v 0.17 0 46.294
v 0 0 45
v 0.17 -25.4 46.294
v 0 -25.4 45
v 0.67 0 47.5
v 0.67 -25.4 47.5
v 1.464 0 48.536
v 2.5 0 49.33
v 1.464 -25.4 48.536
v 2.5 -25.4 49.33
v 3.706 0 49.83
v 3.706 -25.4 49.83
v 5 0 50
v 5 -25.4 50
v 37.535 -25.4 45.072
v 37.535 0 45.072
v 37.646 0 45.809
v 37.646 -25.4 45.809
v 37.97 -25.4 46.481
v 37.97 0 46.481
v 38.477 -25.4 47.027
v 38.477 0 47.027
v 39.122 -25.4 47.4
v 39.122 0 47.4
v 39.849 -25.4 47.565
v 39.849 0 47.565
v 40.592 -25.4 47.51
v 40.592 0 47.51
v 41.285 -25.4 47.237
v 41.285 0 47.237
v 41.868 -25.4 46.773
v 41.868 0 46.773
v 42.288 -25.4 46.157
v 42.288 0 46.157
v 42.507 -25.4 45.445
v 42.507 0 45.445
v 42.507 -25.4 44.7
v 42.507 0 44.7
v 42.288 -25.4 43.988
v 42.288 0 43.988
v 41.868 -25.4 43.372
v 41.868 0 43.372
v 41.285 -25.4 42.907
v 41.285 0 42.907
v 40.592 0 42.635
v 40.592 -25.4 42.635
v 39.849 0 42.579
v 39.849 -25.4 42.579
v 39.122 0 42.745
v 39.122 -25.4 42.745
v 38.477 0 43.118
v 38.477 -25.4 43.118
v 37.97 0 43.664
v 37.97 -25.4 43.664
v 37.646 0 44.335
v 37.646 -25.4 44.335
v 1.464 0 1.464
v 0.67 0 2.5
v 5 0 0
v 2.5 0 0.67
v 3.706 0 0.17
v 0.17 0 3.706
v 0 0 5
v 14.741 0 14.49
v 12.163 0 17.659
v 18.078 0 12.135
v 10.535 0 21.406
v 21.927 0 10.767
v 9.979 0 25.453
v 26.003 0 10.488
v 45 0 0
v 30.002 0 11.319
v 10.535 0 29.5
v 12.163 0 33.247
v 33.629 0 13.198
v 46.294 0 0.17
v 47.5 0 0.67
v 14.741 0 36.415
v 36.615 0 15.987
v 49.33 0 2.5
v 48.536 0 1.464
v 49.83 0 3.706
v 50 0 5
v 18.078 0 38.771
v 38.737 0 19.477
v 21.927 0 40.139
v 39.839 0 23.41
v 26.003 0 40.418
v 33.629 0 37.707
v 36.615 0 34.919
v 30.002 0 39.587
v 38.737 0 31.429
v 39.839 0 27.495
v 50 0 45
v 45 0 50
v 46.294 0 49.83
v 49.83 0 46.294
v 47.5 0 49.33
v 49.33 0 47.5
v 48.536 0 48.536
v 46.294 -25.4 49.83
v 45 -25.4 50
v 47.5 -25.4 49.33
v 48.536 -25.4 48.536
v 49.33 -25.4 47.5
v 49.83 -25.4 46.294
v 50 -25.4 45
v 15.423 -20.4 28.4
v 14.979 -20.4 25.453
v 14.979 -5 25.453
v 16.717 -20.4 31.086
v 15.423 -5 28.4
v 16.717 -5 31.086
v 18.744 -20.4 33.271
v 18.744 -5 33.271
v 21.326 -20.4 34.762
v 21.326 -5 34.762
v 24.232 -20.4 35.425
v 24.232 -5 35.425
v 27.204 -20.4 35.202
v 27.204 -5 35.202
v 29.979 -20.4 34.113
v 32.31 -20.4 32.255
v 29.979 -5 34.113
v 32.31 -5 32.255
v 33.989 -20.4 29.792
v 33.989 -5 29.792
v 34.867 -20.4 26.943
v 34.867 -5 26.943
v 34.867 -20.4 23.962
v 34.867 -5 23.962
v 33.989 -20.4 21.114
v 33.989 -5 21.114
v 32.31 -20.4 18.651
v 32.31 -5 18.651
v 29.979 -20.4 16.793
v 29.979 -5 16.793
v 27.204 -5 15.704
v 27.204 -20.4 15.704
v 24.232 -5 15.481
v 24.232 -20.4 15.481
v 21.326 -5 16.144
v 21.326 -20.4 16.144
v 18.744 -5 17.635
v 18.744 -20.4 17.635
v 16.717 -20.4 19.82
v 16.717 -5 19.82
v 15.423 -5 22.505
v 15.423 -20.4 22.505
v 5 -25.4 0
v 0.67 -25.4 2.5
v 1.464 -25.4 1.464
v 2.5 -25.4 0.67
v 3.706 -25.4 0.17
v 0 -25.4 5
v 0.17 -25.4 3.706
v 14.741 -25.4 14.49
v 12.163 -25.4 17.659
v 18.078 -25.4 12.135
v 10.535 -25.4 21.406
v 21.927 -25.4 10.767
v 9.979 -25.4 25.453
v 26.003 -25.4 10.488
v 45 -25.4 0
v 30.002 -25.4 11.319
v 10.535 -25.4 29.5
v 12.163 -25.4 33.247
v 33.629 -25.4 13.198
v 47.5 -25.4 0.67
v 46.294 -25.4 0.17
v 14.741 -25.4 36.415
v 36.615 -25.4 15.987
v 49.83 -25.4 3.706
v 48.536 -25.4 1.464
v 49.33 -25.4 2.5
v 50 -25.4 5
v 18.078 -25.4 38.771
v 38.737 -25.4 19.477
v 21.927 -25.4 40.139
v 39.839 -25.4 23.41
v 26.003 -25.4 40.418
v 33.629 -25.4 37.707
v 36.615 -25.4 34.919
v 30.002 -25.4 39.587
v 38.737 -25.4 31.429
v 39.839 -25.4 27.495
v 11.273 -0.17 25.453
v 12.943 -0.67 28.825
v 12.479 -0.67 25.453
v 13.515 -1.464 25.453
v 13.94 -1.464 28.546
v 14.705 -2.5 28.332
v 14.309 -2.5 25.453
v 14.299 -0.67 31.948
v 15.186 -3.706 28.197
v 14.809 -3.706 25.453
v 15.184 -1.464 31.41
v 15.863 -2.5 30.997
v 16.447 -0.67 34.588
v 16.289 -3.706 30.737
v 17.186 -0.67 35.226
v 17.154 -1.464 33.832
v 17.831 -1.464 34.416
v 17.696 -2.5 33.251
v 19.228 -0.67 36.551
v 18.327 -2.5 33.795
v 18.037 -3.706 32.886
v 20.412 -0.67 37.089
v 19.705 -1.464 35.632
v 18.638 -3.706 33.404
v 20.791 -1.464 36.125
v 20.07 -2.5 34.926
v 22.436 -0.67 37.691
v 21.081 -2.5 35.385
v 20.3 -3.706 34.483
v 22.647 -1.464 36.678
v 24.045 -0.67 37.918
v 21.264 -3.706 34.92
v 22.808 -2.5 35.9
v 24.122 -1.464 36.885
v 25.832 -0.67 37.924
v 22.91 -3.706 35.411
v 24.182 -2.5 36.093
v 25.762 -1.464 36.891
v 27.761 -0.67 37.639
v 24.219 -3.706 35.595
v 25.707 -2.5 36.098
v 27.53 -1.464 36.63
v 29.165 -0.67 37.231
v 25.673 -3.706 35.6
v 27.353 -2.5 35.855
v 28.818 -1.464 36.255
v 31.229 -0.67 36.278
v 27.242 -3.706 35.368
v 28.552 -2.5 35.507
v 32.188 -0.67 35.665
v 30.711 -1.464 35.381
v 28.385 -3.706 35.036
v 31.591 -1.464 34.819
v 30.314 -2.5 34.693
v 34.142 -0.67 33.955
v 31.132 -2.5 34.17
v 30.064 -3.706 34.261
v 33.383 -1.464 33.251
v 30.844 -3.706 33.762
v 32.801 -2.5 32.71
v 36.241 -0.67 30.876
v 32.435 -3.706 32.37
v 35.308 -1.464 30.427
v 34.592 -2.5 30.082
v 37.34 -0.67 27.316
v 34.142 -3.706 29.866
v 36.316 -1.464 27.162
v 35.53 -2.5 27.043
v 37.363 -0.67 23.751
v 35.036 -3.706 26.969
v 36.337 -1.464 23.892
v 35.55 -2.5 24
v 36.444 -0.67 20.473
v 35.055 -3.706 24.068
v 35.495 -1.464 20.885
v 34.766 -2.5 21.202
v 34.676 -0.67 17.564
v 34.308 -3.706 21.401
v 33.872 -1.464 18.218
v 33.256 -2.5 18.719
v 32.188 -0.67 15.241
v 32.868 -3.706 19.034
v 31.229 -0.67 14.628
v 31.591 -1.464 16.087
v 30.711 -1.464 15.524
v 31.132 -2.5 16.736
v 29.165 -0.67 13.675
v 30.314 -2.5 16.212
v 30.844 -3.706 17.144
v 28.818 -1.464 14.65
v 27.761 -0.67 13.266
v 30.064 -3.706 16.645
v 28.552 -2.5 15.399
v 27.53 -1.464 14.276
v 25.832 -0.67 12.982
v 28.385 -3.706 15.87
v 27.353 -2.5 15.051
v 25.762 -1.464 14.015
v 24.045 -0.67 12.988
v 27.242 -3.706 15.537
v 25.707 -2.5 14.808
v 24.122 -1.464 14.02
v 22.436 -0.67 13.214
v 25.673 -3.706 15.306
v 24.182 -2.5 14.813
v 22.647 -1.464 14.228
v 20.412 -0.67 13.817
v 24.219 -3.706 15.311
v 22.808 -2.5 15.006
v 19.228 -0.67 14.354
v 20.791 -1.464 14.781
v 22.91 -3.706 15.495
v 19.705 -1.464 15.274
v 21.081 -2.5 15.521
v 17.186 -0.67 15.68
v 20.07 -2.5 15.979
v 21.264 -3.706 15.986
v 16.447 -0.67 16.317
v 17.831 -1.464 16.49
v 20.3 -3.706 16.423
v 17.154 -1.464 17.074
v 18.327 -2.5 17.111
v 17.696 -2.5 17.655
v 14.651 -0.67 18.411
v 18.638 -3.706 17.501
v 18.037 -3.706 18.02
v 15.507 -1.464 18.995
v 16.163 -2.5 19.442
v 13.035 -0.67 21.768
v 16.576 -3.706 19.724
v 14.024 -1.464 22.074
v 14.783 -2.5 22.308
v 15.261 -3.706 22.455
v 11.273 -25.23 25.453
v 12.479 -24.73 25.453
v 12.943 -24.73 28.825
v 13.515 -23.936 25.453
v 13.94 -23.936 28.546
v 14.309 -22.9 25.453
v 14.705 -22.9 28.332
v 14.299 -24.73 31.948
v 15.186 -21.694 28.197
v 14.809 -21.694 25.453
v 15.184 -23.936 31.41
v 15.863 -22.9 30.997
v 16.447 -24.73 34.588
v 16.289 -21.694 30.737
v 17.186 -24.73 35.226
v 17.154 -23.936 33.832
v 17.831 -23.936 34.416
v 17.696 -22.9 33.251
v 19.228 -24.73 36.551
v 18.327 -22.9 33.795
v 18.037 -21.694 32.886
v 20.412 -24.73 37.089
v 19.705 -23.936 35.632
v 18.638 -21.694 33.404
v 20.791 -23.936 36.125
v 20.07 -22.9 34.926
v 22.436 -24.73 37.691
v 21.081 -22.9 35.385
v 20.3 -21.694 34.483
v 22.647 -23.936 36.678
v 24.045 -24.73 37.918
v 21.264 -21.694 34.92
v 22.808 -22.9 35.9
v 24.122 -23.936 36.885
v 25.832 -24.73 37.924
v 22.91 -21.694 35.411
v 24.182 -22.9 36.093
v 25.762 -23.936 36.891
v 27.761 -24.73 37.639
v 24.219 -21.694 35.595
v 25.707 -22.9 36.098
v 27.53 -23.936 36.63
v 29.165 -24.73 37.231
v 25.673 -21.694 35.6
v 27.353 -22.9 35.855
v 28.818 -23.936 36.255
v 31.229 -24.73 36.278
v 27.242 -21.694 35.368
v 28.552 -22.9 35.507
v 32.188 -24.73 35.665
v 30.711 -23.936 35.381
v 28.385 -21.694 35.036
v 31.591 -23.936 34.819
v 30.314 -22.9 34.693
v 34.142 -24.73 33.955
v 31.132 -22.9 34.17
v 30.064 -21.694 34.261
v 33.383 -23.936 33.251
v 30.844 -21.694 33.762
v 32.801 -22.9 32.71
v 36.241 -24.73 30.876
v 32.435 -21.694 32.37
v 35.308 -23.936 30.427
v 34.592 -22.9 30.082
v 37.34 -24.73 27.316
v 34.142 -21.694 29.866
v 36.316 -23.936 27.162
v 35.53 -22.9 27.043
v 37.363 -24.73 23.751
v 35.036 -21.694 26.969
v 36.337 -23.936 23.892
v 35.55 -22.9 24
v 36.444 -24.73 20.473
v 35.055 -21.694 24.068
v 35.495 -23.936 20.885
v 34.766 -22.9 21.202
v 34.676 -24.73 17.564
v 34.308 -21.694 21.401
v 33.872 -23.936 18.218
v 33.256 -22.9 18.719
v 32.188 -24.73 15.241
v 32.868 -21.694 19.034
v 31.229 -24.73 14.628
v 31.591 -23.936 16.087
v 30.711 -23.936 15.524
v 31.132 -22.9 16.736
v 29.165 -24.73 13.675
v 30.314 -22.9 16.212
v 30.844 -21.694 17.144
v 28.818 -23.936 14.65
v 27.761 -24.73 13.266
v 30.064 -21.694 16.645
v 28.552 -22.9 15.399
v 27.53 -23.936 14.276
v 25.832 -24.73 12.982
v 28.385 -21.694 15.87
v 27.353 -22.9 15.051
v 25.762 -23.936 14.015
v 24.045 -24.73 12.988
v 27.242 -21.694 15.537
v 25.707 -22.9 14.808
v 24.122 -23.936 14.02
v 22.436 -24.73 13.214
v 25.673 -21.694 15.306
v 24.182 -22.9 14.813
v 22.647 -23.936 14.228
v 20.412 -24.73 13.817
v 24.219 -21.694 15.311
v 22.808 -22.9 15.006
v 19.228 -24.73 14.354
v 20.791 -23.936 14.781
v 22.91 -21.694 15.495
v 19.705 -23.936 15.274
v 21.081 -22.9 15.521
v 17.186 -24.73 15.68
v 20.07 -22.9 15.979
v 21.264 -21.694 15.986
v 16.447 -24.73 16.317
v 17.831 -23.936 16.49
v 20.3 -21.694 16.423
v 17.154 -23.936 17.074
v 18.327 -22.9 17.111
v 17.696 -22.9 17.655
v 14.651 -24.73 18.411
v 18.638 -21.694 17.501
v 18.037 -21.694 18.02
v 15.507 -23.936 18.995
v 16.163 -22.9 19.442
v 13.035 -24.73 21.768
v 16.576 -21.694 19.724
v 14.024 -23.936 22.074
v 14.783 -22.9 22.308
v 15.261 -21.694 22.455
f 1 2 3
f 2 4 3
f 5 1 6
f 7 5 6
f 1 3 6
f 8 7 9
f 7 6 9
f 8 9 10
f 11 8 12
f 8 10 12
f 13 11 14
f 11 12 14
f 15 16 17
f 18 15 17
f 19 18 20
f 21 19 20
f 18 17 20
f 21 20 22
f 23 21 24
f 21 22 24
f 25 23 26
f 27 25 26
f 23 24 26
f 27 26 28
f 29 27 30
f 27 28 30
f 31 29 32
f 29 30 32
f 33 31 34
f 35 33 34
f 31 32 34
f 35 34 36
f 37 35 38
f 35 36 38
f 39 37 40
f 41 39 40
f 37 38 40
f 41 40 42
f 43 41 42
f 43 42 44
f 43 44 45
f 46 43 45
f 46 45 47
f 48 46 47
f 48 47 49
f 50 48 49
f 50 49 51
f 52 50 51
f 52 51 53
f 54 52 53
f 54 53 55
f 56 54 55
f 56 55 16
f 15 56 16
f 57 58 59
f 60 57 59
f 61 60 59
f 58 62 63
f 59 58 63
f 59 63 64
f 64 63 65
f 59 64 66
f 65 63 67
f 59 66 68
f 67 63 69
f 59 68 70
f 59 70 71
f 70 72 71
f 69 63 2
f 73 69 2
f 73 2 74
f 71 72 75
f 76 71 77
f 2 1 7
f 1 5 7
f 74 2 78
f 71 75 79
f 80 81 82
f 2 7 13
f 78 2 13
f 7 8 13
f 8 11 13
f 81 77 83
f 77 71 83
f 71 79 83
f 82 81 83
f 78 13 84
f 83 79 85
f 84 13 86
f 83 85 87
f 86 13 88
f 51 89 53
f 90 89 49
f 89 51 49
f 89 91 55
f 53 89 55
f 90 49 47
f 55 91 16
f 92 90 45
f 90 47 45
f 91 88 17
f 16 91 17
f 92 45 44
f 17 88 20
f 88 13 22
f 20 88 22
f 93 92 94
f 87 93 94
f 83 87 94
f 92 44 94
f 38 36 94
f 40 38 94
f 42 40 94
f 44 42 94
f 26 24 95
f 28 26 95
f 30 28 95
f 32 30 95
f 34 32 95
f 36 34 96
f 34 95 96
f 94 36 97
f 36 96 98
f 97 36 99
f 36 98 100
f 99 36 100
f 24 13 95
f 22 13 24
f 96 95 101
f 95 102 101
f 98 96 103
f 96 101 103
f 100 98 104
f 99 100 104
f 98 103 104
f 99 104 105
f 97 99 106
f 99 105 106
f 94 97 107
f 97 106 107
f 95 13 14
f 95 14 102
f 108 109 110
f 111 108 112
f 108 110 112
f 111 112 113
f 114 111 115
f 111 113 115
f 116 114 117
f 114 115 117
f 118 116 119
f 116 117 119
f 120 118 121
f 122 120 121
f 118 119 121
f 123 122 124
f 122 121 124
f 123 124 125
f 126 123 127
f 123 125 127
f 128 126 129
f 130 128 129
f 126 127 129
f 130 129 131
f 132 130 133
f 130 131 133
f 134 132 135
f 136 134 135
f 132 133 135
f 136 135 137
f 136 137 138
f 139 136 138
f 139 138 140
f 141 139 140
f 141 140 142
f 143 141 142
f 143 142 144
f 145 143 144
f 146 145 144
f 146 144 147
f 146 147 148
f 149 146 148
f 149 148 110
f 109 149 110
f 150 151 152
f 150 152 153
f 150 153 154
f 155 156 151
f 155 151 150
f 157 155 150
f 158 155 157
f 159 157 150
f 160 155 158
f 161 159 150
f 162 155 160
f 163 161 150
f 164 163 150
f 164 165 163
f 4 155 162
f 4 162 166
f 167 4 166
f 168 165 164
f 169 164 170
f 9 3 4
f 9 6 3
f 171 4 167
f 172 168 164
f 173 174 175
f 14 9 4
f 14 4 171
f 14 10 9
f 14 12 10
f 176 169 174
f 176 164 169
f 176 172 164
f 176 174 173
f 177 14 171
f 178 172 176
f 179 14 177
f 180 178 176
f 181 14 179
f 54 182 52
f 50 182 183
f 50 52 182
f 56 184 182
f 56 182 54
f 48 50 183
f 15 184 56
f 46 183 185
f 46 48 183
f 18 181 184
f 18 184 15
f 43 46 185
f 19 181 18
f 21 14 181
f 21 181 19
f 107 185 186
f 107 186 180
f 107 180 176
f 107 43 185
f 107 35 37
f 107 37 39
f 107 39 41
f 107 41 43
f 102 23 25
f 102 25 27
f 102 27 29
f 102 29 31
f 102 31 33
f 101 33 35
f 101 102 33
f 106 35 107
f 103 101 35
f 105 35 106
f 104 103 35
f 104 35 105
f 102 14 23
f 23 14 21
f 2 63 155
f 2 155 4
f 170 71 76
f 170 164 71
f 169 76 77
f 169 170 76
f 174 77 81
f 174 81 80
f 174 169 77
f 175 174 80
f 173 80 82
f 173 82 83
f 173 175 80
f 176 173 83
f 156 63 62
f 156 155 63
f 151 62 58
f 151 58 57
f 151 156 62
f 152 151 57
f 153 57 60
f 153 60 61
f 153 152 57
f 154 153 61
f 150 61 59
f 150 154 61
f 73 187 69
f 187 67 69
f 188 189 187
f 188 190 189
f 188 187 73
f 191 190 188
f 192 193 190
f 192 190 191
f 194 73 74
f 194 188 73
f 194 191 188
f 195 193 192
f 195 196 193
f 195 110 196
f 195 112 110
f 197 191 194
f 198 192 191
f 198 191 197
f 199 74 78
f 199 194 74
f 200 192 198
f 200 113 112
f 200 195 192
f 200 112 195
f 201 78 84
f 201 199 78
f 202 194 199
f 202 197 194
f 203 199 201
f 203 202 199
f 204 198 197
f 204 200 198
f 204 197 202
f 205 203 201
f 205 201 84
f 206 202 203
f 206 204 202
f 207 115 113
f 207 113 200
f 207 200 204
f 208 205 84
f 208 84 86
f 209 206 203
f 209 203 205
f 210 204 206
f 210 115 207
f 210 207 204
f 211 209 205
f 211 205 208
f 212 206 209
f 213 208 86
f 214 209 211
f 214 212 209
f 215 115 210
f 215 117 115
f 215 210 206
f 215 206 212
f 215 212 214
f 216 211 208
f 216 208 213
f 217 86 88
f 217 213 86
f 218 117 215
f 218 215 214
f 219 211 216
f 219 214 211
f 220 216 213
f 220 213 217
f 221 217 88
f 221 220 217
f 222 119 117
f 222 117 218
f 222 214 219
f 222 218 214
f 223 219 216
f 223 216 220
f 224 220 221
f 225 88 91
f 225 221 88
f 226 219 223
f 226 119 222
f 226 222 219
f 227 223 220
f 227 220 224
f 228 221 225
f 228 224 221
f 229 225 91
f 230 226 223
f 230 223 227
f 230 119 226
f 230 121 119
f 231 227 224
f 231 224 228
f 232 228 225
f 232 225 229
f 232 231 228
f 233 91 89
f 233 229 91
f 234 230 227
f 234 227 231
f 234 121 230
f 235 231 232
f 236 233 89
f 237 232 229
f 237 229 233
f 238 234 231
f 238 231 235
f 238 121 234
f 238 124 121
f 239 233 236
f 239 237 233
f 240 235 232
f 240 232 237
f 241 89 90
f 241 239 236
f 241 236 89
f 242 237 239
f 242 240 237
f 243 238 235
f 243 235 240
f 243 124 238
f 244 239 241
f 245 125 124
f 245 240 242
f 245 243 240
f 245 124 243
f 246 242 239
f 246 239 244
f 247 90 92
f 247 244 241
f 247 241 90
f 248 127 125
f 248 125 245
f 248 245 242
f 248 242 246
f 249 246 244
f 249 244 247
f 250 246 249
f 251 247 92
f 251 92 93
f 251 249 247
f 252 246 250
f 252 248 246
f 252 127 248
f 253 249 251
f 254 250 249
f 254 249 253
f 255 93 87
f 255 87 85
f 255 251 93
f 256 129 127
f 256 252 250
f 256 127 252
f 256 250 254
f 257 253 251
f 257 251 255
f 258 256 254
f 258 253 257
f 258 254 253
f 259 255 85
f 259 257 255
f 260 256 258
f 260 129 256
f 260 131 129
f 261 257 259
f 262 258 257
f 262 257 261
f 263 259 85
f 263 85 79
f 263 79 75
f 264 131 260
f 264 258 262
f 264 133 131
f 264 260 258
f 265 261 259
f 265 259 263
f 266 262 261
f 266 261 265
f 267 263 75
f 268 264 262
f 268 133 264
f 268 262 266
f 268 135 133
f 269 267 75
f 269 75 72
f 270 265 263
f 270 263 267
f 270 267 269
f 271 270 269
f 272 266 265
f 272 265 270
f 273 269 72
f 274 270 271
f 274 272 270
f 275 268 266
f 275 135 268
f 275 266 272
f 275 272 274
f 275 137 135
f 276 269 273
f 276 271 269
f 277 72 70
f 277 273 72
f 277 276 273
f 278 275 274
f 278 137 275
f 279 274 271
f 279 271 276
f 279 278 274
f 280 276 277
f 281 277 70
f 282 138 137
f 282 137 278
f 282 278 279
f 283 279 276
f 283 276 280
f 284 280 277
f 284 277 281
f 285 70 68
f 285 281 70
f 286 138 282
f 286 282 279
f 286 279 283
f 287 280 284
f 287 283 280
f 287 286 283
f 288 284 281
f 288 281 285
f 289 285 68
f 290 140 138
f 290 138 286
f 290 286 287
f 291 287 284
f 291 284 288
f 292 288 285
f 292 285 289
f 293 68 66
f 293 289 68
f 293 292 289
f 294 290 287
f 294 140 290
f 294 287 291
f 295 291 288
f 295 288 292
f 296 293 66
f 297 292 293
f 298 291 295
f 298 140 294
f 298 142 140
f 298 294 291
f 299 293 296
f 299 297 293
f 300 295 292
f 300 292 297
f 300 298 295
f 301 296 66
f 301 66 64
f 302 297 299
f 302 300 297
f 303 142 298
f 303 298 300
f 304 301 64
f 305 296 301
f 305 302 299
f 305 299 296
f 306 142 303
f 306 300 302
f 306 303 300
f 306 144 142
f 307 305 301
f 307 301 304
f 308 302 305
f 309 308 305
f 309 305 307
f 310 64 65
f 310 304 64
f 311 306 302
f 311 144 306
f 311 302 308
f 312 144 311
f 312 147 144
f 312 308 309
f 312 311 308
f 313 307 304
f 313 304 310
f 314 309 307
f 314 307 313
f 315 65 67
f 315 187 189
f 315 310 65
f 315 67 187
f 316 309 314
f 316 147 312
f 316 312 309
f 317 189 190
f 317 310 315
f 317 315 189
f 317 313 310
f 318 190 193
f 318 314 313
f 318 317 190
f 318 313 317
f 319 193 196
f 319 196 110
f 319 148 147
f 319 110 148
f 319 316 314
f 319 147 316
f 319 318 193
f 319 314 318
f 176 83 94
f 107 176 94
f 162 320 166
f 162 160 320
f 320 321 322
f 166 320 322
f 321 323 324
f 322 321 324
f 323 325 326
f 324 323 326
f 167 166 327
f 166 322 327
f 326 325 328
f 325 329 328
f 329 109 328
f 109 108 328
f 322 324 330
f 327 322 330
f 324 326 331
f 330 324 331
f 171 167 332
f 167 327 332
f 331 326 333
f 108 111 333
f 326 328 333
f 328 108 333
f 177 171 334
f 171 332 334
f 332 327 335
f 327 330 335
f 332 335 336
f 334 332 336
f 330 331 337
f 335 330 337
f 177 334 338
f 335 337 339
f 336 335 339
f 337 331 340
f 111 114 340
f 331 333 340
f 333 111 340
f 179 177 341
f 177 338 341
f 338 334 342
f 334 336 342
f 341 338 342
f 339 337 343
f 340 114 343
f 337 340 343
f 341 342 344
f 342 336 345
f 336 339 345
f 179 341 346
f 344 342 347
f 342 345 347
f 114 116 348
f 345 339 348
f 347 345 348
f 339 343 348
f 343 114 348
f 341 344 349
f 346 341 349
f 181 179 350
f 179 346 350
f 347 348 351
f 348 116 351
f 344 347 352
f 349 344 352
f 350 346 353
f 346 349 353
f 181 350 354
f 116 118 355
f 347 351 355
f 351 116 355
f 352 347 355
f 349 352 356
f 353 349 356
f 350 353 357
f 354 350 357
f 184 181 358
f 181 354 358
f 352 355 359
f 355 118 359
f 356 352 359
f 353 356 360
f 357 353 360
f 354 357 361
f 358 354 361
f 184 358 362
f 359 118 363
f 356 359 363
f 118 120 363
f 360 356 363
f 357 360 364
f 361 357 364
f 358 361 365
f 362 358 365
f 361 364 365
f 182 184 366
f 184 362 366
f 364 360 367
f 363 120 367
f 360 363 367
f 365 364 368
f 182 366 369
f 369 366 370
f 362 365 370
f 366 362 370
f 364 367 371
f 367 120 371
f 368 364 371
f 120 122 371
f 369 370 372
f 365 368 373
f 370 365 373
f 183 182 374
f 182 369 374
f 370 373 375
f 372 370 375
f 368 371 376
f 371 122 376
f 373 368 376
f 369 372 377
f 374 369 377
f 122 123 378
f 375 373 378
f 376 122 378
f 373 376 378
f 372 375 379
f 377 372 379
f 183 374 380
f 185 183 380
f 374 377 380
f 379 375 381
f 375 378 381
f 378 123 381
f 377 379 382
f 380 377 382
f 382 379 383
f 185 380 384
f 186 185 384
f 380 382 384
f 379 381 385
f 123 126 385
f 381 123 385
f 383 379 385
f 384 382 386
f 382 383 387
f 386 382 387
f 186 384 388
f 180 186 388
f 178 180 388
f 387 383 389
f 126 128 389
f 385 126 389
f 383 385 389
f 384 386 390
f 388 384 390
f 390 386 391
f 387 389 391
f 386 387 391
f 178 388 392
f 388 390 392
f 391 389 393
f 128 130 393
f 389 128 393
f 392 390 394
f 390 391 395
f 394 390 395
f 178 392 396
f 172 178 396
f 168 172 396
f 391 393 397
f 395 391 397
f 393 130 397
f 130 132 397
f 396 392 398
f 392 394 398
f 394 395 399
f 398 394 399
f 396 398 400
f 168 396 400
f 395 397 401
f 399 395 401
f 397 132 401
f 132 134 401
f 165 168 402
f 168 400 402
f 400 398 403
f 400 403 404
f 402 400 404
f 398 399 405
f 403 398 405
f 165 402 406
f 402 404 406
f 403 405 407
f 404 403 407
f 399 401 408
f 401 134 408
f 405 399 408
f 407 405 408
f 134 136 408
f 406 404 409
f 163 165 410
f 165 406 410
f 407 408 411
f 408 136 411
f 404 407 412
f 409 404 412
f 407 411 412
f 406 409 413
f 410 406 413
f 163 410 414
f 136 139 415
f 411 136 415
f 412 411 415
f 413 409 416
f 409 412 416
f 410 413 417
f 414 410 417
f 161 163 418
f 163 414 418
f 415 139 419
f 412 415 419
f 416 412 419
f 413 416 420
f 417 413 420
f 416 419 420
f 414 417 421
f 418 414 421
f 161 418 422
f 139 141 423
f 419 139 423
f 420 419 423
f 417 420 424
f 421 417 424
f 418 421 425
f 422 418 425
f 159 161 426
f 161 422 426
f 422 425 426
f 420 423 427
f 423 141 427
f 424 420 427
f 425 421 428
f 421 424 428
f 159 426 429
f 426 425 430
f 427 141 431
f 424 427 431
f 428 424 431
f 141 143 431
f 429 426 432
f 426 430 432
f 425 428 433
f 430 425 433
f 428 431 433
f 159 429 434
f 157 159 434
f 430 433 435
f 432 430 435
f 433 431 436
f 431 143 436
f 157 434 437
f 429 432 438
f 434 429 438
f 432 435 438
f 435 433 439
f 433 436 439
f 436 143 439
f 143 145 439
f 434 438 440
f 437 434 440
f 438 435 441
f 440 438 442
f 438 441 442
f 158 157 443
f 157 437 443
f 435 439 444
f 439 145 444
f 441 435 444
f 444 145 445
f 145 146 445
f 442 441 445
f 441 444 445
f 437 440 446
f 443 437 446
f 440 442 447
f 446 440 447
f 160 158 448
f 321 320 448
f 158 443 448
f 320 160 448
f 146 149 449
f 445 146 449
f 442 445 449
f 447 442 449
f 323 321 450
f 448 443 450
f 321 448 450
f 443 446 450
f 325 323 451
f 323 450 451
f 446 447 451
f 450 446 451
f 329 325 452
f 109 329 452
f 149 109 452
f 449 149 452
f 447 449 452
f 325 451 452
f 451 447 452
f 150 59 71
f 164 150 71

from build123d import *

# Parameters (mm, degrees)
F0_W     = 50
F0_H     = 50
F1_DEPTH = 25.4
F3_D     = 20
F4_R     = 5
F6_D     = 5


with BuildPart() as f1:
    # F0 (on Front) → F1 (new body)
    with BuildSketch(Plane.XZ):
        with Locations((25, 25)):
            Rectangle(F0_W, F0_H)
    extrude(amount=F1_DEPTH)

    # F3 (through all)
    with Locations(Plane.XZ.offset(25.4)):
        with Locations((24.9791759998, 25.4528727382)):
            Hole(F3_D / 2)

    # F4
    f4_edges = [f1.edges().sort_by_distance(p)[0] for p in [
        (50, -12.7, 50),
        (50, -12.7, 0),
        (0, -12.7, 50),
        (0, -12.7, 0),
        (14.979176, 0, 25.452873),
        (14.979176, -25.4, 25.452873),
    ]]
    fillet(f4_edges, radius=F4_R)

    # F6 (through all)
    with Locations(Plane.XZ.offset(25.4)):
        with Locations((40.0353602501, 45.0723162054)):
            Hole(F6_D / 2)


solid = f1.part
